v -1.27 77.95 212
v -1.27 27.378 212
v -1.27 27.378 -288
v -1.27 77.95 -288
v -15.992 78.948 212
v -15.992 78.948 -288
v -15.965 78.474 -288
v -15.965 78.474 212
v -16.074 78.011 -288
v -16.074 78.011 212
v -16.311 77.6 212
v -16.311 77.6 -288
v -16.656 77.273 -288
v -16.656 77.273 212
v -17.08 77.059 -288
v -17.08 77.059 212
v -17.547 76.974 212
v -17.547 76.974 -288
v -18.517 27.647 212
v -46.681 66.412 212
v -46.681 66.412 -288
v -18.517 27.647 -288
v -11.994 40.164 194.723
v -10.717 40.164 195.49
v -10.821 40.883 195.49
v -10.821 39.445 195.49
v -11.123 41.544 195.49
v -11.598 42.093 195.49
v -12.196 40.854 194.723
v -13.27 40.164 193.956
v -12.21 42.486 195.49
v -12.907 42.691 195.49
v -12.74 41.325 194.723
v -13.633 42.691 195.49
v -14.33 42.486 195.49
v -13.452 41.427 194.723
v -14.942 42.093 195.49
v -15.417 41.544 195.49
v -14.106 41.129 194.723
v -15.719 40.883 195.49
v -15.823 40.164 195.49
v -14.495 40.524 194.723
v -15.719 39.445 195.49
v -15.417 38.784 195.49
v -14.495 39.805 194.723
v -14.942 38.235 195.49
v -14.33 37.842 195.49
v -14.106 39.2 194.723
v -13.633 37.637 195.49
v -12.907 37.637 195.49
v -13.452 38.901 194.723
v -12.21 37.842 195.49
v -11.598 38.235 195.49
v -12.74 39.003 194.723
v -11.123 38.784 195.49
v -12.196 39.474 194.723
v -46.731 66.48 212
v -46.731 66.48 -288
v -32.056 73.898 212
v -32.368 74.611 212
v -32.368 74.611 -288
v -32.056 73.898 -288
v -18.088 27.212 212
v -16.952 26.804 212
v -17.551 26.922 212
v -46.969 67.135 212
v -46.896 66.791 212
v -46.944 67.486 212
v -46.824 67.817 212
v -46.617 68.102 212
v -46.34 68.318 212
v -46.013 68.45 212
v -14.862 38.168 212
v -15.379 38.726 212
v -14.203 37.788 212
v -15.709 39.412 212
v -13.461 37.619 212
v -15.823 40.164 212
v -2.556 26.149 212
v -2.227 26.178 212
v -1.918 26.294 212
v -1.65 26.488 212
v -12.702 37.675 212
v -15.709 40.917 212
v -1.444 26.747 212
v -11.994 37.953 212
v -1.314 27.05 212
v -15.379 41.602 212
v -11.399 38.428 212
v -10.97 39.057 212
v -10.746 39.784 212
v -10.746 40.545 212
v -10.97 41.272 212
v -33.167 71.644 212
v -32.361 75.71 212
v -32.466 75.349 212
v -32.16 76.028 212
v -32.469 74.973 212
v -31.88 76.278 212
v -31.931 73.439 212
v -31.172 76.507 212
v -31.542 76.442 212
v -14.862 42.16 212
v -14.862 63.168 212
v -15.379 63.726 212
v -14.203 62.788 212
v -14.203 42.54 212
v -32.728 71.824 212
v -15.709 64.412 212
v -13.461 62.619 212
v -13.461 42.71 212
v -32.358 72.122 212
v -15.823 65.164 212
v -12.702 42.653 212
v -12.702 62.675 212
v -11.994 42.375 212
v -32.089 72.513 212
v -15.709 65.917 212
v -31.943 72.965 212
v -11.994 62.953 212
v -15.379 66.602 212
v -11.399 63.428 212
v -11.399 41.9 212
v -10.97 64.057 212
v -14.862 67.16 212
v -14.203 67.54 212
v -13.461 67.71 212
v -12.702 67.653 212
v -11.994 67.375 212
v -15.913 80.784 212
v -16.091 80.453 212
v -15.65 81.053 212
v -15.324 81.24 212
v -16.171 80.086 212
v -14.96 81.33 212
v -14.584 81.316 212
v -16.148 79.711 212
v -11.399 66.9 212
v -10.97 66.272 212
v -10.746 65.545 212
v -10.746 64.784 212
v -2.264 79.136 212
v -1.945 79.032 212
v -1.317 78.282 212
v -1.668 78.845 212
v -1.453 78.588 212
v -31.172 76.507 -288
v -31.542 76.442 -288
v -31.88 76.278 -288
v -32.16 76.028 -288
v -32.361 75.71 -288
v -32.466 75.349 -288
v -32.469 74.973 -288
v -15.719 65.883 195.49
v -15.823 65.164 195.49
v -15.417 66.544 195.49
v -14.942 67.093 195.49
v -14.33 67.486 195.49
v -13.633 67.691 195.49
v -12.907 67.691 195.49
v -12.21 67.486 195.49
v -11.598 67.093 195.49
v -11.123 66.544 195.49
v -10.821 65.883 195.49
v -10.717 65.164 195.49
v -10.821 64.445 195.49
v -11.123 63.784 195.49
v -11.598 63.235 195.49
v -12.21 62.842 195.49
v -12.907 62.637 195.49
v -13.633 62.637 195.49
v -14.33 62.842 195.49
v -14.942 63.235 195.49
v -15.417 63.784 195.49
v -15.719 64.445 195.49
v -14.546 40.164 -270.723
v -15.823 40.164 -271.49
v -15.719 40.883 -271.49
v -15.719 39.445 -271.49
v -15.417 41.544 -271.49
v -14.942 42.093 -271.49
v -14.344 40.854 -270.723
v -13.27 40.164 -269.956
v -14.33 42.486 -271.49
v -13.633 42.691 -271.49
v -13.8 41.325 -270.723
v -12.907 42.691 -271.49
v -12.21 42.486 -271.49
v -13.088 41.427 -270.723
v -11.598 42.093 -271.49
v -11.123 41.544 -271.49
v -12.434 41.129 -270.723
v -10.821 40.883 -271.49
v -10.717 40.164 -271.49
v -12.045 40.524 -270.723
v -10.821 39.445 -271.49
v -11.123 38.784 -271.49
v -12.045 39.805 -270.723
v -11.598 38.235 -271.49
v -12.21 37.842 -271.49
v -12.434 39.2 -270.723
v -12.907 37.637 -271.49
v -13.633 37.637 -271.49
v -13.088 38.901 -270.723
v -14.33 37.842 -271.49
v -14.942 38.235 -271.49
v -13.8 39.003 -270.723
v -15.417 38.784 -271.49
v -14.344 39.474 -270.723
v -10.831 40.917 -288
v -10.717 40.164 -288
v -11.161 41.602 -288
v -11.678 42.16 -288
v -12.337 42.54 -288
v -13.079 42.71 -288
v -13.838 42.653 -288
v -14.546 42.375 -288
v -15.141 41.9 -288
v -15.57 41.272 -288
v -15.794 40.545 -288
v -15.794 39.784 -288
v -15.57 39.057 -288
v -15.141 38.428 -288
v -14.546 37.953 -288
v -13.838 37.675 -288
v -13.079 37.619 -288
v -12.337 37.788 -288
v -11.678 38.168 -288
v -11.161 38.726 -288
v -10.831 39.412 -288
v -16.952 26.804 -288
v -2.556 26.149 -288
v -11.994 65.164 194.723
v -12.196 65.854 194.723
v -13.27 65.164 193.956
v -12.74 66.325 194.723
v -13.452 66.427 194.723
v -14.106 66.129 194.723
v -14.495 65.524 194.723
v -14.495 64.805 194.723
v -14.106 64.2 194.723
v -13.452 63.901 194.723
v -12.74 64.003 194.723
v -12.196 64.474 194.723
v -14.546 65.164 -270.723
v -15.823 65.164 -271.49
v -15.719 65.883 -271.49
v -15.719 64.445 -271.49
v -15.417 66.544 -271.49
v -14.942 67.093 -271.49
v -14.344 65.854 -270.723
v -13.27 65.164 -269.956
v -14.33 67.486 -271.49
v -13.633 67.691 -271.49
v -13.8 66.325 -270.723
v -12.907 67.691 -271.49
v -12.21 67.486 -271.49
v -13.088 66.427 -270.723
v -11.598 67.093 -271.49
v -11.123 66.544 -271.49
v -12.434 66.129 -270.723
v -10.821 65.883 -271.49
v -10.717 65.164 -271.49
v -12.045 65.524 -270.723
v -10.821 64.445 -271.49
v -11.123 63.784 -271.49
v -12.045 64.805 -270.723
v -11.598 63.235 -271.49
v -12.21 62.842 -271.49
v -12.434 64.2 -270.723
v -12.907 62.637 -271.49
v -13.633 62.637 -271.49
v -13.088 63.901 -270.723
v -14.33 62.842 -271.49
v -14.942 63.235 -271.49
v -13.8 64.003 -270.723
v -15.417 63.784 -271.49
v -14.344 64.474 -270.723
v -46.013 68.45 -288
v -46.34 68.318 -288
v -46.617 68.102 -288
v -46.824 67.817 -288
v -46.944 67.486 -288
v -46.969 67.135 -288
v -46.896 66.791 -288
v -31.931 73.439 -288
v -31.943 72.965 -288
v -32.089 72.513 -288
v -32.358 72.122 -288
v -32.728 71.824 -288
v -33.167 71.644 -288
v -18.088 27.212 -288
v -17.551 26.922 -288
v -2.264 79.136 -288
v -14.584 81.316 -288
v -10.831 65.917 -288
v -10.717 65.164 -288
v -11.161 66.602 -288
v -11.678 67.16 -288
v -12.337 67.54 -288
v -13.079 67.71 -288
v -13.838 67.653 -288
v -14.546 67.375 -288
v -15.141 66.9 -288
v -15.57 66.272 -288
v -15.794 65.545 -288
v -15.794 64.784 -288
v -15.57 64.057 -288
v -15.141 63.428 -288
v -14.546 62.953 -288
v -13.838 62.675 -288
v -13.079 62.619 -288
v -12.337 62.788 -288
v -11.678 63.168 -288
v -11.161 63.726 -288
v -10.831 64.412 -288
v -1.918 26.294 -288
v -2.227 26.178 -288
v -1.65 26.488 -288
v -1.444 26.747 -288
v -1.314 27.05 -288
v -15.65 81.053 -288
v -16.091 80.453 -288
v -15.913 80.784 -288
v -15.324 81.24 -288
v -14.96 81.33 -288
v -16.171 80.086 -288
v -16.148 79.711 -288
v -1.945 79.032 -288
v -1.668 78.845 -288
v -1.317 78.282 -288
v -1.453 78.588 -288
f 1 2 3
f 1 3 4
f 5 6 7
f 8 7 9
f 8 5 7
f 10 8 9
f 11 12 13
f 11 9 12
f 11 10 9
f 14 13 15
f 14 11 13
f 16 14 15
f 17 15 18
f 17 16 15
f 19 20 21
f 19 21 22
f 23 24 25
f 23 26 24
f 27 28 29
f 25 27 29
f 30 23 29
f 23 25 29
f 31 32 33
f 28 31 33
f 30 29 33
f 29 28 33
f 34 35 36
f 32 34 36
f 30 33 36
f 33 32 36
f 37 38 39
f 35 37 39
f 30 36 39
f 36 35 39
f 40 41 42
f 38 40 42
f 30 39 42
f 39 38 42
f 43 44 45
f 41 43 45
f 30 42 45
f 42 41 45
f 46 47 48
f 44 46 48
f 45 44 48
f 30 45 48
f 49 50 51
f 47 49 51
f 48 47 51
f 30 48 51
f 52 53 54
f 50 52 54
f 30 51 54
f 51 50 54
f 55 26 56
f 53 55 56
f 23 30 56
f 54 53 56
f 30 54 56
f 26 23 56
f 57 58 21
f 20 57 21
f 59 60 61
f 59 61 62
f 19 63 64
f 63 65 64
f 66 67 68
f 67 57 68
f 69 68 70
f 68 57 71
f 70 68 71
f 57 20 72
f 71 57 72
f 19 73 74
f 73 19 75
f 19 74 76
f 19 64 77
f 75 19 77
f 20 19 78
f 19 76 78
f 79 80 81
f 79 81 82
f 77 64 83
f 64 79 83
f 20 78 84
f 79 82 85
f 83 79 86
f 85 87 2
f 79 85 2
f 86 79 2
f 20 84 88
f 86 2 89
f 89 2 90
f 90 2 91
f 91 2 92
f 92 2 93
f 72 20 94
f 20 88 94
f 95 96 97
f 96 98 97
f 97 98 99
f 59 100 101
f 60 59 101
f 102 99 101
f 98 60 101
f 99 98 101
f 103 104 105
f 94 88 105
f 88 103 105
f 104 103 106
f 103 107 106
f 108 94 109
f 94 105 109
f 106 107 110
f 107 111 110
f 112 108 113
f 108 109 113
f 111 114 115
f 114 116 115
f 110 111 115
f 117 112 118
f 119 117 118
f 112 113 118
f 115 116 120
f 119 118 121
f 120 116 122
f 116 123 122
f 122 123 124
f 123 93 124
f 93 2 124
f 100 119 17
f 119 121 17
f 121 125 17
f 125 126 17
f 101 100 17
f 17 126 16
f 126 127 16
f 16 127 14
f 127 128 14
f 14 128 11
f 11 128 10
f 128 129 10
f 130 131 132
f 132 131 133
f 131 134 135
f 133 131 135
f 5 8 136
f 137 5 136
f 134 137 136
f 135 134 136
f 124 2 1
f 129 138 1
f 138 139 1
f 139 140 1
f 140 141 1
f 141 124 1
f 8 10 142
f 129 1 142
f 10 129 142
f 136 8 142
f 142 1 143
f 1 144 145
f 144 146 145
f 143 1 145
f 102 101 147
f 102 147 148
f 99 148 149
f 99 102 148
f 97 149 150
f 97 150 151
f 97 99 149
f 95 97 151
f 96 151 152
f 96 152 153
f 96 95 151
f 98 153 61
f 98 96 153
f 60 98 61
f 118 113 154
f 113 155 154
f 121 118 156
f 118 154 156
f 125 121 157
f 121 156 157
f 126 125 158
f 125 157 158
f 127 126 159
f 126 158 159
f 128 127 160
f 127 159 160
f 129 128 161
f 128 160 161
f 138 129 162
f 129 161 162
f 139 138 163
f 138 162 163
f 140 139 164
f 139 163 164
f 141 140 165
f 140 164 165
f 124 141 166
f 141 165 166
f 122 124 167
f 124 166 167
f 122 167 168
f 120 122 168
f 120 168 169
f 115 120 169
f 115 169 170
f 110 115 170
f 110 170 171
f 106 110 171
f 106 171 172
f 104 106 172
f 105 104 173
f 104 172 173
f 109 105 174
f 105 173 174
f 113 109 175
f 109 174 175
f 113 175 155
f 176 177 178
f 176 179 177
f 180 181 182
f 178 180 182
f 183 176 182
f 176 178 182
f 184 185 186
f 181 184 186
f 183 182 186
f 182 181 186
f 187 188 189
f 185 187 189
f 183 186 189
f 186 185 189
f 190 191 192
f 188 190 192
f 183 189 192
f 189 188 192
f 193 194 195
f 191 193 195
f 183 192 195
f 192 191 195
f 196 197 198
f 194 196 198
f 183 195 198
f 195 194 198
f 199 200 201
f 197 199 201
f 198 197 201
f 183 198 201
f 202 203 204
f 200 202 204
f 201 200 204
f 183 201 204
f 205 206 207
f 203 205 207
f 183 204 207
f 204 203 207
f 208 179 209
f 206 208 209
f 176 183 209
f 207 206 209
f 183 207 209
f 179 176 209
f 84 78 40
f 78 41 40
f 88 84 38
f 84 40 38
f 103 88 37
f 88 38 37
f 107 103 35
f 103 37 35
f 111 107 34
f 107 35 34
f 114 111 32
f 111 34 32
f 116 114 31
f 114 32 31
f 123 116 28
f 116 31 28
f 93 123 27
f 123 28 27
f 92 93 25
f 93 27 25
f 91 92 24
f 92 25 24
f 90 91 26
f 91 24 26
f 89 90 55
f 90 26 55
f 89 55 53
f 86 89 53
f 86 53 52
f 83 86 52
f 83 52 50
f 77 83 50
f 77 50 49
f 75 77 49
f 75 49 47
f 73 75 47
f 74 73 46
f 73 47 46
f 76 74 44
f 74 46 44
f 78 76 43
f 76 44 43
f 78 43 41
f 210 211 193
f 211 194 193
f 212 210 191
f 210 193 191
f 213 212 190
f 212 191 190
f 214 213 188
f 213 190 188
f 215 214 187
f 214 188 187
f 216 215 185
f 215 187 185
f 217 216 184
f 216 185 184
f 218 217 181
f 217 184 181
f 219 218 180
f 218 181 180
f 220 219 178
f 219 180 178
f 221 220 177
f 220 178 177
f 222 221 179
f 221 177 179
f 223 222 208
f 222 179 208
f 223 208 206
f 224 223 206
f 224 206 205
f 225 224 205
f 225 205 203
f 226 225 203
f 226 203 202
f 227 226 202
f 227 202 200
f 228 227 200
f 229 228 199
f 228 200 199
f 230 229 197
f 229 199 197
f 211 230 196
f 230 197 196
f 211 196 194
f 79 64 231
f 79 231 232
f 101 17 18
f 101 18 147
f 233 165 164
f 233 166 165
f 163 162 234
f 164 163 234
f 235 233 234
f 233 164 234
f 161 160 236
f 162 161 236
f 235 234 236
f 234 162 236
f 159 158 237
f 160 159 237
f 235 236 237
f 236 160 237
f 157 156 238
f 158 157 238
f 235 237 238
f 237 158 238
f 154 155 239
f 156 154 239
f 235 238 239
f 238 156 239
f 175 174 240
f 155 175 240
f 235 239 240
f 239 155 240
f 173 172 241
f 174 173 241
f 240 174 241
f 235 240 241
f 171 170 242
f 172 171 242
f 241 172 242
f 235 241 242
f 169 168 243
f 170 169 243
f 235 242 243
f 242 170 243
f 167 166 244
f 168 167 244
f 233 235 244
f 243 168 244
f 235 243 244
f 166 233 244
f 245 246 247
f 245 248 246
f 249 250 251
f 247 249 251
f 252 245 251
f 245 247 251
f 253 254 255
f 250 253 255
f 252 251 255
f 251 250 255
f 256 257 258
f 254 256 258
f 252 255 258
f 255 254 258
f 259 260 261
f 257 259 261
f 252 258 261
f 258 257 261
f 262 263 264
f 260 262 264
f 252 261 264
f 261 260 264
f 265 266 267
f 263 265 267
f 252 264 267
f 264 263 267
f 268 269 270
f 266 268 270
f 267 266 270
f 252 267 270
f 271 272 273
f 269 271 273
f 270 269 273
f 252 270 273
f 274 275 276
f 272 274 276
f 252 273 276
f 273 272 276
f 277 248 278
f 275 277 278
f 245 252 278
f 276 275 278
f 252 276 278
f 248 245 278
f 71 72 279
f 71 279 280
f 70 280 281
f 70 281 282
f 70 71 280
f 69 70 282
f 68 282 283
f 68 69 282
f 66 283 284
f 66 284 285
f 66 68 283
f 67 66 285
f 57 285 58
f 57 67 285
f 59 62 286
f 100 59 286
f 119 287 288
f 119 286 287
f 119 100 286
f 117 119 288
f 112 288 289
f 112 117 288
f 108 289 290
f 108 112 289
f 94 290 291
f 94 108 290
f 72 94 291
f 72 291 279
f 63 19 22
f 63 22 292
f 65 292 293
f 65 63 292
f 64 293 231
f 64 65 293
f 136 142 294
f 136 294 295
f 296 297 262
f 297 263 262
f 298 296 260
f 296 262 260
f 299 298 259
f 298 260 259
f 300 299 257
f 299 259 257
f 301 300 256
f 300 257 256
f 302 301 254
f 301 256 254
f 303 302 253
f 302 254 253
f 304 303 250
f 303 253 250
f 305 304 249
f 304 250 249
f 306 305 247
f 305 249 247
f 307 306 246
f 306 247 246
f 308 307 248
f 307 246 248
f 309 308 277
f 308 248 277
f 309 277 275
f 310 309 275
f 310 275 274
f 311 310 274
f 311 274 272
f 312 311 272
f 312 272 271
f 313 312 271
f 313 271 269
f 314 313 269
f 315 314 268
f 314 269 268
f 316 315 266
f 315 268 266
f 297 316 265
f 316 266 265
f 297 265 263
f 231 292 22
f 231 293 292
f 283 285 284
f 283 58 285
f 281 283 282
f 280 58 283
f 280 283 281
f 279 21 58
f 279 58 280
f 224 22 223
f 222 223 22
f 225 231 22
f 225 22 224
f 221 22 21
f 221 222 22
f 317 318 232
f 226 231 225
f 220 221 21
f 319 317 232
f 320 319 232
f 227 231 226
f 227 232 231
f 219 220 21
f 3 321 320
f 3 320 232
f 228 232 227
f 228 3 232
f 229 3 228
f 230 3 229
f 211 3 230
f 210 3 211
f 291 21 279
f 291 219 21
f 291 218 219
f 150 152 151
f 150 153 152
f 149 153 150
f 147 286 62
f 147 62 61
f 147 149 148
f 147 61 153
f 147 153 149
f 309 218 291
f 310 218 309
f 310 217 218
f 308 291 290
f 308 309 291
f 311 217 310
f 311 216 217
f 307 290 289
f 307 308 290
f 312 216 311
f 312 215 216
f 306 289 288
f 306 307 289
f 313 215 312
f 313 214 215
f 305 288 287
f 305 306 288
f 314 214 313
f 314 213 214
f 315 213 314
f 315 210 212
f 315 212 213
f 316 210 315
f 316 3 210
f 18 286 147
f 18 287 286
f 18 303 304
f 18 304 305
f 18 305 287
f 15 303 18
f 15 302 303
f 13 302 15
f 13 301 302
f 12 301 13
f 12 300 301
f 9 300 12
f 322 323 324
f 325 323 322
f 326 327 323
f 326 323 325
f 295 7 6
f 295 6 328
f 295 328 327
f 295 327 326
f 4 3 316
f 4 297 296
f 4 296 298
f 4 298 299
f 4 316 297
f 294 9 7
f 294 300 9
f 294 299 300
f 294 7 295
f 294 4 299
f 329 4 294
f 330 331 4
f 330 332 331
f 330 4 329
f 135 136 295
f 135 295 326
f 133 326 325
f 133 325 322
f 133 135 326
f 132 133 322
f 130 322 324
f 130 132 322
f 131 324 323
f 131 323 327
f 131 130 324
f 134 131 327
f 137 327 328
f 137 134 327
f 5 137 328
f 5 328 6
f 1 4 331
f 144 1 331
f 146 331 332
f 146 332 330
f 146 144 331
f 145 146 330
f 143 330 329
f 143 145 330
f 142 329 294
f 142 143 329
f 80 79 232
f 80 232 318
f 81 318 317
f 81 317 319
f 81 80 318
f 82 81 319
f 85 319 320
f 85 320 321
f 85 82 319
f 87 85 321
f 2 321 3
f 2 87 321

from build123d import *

# Parameters (mm, degrees)
EXTRUDE_THIN1_DEPTH                   = 137.50025
EXTRUDE_THIN1_DEPTH_BACK              = 213.5
BOSS_EXTRUDE1_DEPTH                   = 212.50025
BOSS_EXTRUDE1_DEPTH_BACK              = 288.5
SKETCH3_OUTSIDE_W                     = 604.22
SKETCH3_OUTSIDE_H                     = 158.409
SKETCH3_OUTSIDE_W_2                   = 500
SKETCH3_OUTSIDE_H_2                   = 100
CUT_EXTRUDE1_DEPTH                    = 47.9721863
F_1_4_20_TAPPED_HOLE1_D               = 5.1054
F_1_4_20_TAPPED_HOLE1_DEPTH           = 16.51
F_1_4_20_TAPPED_HOLE1_TIP             = 1.533816902
F_1_4_20_TAPPED_HOLE1_ON_FACE_2_D     = 5.1054
F_1_4_20_TAPPED_HOLE1_ON_FACE_2_DEPTH = 16.51
F_1_4_20_TAPPED_HOLE1_ON_FACE_2_TIP   = 1.533816902


with BuildPart() as part:
    # Sketch1 → Extrude-Thin1 (new body, two sides)
    with BuildSketch(Plane.XY) as extrude_thin1_sk:
        with BuildLine():
            Line((-1, 27.377741566), (-1, 77.801426032))
            ThreePointArc((-1, 77.801426032), (-1.350622843, 78.765237295), (-2.238576202, 79.278469565))
            Line((-2.238576202, 79.278469565), (-14.558703221, 81.459024387))
            ThreePointArc((-14.558703221, 81.459024387), (-15.894736771, 81.028505523), (-16.289731152, 79.681541685))
            Line((-16.289731152, 79.681541685), (-16.133756174, 78.918587001))
            ThreePointArc((-16.133756174, 78.918587001), (-16.425245763, 77.689683441), (-17.551976749, 77.11902818))
            Line((-17.551976749, 77.11902818), (-31.176844118, 76.65202466))
            ThreePointArc((-31.176844118, 76.65202466), (-32.394172225, 75.953136671), (-32.500485501, 74.553483275))
            Line((-32.500485501, 74.553483275), (-32.189291753, 73.839630003))
            ThreePointArc((-32.189291753, 73.839630003), (-32.218908178, 72.576976841), (-33.202371488, 71.784531222))
            Line((-33.202371488, 71.784531222), (-46.048094302, 68.590520723))
            ThreePointArc((-46.048094302, 68.590520723), (-47.095522714, 67.648327859), (-46.899674588, 66.253165796))
            Line((-46.899674588, 66.253165796), (-18.735090298, 27.487941181))
            ThreePointArc((-18.735090298, 27.487941181), (-17.958226336, 26.809018221), (-16.963801619, 26.534111898))
            Line((-16.963801619, 26.534111898), (-2.568160686, 25.879290992))
            ThreePointArc((-2.568160686, 25.879290992), (-1.463718433, 26.293250665), (-1, 27.377741566))
        make_face()
        with BuildLine():
            Line((-1.27, 27.377741566), (-1.27, 77.801426032))
            ThreePointArc((-1.27, 77.801426032), (-1.557510731, 78.591751268), (-2.285632486, 79.012601729))
            Line((-2.285632486, 79.012601729), (-14.605759505, 81.193156552))
            ThreePointArc((-14.605759505, 81.193156552), (-15.701307016, 80.840131082), (-16.025202408, 79.735620736))
            Line((-16.025202408, 79.735620736), (-15.86922743, 78.972666052))
            ThreePointArc((-15.86922743, 78.972666052), (-16.213185146, 77.522559851), (-17.542727708, 76.849186643))
            Line((-17.542727708, 76.849186643), (-31.167595078, 76.382183123))
            ThreePointArc((-31.167595078, 76.382183123), (-32.165804125, 75.809094972), (-32.252981012, 74.661379187))
            Line((-32.252981012, 74.661379187), (-31.941787264, 73.947525915))
            ThreePointArc((-31.941787264, 73.947525915), (-31.976734646, 72.457595184), (-33.137221351, 71.522509354))
            Line((-33.137221351, 71.522509354), (-45.982944165, 68.328498854))
            ThreePointArc((-45.982944165, 68.328498854), (-46.841835463, 67.555900706), (-46.68124, 66.411867814))
            Line((-46.68124, 66.411867814), (-18.516655709, 27.646643199))
            ThreePointArc((-18.516655709, 27.646643199), (-17.830213301, 27.046742143), (-16.951532696, 26.803833001))
            Line((-16.951532696, 26.803833001), (-2.555891763, 26.149012095))
            ThreePointArc((-2.555891763, 26.149012095), (-1.650249115, 26.488459027), (-1.27, 27.377741566))
        make_face(mode=Mode.SUBTRACT)
    extrude(amount=EXTRUDE_THIN1_DEPTH)
    extrude(extrude_thin1_sk.sketch, amount=-EXTRUDE_THIN1_DEPTH_BACK)


with BuildPart() as body_2:
    # Sketch2 → Boss-Extrude1 (new body, two sides)
    with BuildSketch(Plane.XY) as boss_extrude1_sk:
        with BuildLine():
            Line((-46.68124, 66.411867814), (-18.516655709, 27.646643199))
            ThreePointArc((-18.516655709, 27.646643199), (-17.830213301, 27.046742143), (-16.951532696, 26.803833001))
            Line((-16.951532696, 26.803833001), (-2.555891763, 26.149012095))
            ThreePointArc((-2.555891763, 26.149012095), (-1.650249115, 26.488459027), (-1.27, 27.377741566))
            Line((-1.27, 27.377741566), (-1.27, 77.801426032))
            Line((-1.27, 77.801426032), (-1.27, 77.950492711))
            ThreePointArc((-1.27, 77.950492711), (-1.551343626, 78.723865471), (-2.263847169, 79.13568869))
            Line((-2.263847169, 79.13568869), (-14.583974188, 81.316243513))
            ThreePointArc((-14.583974188, 81.316243513), (-15.790857829, 80.927341471), (-16.147669419, 79.710584138))
            Line((-16.147669419, 79.710584138), (-15.991694441, 78.947629454))
            ThreePointArc((-15.991694441, 78.947629454), (-16.311361358, 77.599931884), (-17.547009672, 76.97411328))
            Line((-17.547009672, 76.97411328), (-31.171877041, 76.50710976))
            ThreePointArc((-31.171877041, 76.50710976), (-32.271530097, 75.875780943), (-32.367566424, 74.611427376))
            Line((-32.367566424, 74.611427376), (-32.056372675, 73.897574104))
            ThreePointArc((-32.056372675, 73.897574104), (-32.088852022, 72.51286447), (-33.167383452, 71.643815774))
            Line((-33.167383452, 71.643815774), (-46.013106265, 68.449805275))
            ThreePointArc((-46.013106265, 68.449805275), (-46.895812161, 67.655785191), (-46.730763846, 66.48003154))
            Line((-46.730763846, 66.48003154), (-46.68124, 66.411867814))
        make_face()
    extrude(amount=BOSS_EXTRUDE1_DEPTH)
    extrude(boss_extrude1_sk.sketch, amount=-BOSS_EXTRUDE1_DEPTH_BACK)

    # Sketch3 outside → Cut-Extrude1 (cut, through all)
    with BuildSketch(Plane(origin=(0, 0, 0), x_dir=(0, 0, -1), z_dir=(1, 0, 0))):
        with Locations((38, 53.7425)):
            Rectangle(SKETCH3_OUTSIDE_W, SKETCH3_OUTSIDE_H)
        with Locations((37.999875, 52.664117138)):
            Rectangle(SKETCH3_OUTSIDE_W_2, SKETCH3_OUTSIDE_H_2, mode=Mode.SUBTRACT)
    extrude(amount=-CUT_EXTRUDE1_DEPTH, mode=Mode.SUBTRACT)

    # 1/4-20 Tapped Hole1
    with Locations(Plane(origin=(-13.27, 65.164117138, 212.000125), x_dir=(1, 0, 0), z_dir=(0, 0, 1))):
        with Locations((0, 0), (0, -25)):
            Hole(F_1_4_20_TAPPED_HOLE1_D / 2, depth=F_1_4_20_TAPPED_HOLE1_DEPTH)
            with Locations((0, 0, -(F_1_4_20_TAPPED_HOLE1_DEPTH + F_1_4_20_TAPPED_HOLE1_TIP / 2))):  # 118° drill point
                Cone(0, F_1_4_20_TAPPED_HOLE1_D / 2, F_1_4_20_TAPPED_HOLE1_TIP, mode=Mode.SUBTRACT)

    # 1/4-20 Tapped Hole1 on face 2
    with Locations(Plane(origin=(-13.27, 65.164117138, -287.999875), x_dir=(-1, 0, 0), z_dir=(0, 0, -1))):
        with Locations((0, 0), (0, -25)):
            Hole(F_1_4_20_TAPPED_HOLE1_ON_FACE_2_D / 2, depth=F_1_4_20_TAPPED_HOLE1_ON_FACE_2_DEPTH)
            with Locations((0, 0, -(F_1_4_20_TAPPED_HOLE1_ON_FACE_2_DEPTH + F_1_4_20_TAPPED_HOLE1_ON_FACE_2_TIP / 2))):  # 118° drill point
                Cone(0, F_1_4_20_TAPPED_HOLE1_ON_FACE_2_D / 2, F_1_4_20_TAPPED_HOLE1_ON_FACE_2_TIP, mode=Mode.SUBTRACT)


solid = body_2.part
